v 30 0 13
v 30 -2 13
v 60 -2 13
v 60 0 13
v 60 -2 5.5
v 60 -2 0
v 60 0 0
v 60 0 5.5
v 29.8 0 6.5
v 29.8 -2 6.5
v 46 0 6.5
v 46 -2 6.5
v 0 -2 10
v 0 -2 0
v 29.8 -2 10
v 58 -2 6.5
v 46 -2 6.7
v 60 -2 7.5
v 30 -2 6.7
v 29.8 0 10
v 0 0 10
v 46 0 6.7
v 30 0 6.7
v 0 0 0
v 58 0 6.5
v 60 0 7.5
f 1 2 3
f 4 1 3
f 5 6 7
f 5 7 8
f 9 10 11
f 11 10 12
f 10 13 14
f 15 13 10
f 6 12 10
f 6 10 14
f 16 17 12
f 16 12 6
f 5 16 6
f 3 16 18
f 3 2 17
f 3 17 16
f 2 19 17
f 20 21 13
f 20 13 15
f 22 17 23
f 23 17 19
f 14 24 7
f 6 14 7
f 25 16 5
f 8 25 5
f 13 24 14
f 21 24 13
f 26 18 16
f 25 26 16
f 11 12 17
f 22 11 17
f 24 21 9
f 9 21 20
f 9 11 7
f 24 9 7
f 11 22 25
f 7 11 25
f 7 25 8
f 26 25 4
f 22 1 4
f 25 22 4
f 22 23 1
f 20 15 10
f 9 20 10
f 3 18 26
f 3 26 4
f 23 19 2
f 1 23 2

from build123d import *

# Parameters (mm, degrees)
F0_W     = 60
F0_H     = 10
F1_DEPTH = 2
F2_W     = 30
F2_H     = 3
F3_DEPTH = 2
F5_DEPTH = 2.001


with BuildPart() as f1:
    # F0 (on Front) → F1 (new body)
    with BuildSketch(Plane.XZ):
        with Locations((30, 5)):
            Rectangle(F0_W, F0_H)
    extrude(amount=F1_DEPTH)

    # F2 (on face) → F3 (join, through all)
    with BuildSketch(Plane.XZ.offset(2)):
        with Locations((45, 11.5)):
            Rectangle(F2_W, F2_H)
    extrude(amount=-F3_DEPTH)

    # F4 (on face) → F5 (cut, through all)
    with BuildSketch(Plane.XZ.offset(2)):
        Polygon((60, 5.5), (60, 7.5), (58, 6.5), align=None)
        Polygon((30, 6.7), (30, 10), (29.8, 10), (29.8, 6.5), (46, 6.5), (46, 6.7), align=None)
    extrude(amount=-F5_DEPTH, mode=Mode.SUBTRACT)


solid = f1.part
